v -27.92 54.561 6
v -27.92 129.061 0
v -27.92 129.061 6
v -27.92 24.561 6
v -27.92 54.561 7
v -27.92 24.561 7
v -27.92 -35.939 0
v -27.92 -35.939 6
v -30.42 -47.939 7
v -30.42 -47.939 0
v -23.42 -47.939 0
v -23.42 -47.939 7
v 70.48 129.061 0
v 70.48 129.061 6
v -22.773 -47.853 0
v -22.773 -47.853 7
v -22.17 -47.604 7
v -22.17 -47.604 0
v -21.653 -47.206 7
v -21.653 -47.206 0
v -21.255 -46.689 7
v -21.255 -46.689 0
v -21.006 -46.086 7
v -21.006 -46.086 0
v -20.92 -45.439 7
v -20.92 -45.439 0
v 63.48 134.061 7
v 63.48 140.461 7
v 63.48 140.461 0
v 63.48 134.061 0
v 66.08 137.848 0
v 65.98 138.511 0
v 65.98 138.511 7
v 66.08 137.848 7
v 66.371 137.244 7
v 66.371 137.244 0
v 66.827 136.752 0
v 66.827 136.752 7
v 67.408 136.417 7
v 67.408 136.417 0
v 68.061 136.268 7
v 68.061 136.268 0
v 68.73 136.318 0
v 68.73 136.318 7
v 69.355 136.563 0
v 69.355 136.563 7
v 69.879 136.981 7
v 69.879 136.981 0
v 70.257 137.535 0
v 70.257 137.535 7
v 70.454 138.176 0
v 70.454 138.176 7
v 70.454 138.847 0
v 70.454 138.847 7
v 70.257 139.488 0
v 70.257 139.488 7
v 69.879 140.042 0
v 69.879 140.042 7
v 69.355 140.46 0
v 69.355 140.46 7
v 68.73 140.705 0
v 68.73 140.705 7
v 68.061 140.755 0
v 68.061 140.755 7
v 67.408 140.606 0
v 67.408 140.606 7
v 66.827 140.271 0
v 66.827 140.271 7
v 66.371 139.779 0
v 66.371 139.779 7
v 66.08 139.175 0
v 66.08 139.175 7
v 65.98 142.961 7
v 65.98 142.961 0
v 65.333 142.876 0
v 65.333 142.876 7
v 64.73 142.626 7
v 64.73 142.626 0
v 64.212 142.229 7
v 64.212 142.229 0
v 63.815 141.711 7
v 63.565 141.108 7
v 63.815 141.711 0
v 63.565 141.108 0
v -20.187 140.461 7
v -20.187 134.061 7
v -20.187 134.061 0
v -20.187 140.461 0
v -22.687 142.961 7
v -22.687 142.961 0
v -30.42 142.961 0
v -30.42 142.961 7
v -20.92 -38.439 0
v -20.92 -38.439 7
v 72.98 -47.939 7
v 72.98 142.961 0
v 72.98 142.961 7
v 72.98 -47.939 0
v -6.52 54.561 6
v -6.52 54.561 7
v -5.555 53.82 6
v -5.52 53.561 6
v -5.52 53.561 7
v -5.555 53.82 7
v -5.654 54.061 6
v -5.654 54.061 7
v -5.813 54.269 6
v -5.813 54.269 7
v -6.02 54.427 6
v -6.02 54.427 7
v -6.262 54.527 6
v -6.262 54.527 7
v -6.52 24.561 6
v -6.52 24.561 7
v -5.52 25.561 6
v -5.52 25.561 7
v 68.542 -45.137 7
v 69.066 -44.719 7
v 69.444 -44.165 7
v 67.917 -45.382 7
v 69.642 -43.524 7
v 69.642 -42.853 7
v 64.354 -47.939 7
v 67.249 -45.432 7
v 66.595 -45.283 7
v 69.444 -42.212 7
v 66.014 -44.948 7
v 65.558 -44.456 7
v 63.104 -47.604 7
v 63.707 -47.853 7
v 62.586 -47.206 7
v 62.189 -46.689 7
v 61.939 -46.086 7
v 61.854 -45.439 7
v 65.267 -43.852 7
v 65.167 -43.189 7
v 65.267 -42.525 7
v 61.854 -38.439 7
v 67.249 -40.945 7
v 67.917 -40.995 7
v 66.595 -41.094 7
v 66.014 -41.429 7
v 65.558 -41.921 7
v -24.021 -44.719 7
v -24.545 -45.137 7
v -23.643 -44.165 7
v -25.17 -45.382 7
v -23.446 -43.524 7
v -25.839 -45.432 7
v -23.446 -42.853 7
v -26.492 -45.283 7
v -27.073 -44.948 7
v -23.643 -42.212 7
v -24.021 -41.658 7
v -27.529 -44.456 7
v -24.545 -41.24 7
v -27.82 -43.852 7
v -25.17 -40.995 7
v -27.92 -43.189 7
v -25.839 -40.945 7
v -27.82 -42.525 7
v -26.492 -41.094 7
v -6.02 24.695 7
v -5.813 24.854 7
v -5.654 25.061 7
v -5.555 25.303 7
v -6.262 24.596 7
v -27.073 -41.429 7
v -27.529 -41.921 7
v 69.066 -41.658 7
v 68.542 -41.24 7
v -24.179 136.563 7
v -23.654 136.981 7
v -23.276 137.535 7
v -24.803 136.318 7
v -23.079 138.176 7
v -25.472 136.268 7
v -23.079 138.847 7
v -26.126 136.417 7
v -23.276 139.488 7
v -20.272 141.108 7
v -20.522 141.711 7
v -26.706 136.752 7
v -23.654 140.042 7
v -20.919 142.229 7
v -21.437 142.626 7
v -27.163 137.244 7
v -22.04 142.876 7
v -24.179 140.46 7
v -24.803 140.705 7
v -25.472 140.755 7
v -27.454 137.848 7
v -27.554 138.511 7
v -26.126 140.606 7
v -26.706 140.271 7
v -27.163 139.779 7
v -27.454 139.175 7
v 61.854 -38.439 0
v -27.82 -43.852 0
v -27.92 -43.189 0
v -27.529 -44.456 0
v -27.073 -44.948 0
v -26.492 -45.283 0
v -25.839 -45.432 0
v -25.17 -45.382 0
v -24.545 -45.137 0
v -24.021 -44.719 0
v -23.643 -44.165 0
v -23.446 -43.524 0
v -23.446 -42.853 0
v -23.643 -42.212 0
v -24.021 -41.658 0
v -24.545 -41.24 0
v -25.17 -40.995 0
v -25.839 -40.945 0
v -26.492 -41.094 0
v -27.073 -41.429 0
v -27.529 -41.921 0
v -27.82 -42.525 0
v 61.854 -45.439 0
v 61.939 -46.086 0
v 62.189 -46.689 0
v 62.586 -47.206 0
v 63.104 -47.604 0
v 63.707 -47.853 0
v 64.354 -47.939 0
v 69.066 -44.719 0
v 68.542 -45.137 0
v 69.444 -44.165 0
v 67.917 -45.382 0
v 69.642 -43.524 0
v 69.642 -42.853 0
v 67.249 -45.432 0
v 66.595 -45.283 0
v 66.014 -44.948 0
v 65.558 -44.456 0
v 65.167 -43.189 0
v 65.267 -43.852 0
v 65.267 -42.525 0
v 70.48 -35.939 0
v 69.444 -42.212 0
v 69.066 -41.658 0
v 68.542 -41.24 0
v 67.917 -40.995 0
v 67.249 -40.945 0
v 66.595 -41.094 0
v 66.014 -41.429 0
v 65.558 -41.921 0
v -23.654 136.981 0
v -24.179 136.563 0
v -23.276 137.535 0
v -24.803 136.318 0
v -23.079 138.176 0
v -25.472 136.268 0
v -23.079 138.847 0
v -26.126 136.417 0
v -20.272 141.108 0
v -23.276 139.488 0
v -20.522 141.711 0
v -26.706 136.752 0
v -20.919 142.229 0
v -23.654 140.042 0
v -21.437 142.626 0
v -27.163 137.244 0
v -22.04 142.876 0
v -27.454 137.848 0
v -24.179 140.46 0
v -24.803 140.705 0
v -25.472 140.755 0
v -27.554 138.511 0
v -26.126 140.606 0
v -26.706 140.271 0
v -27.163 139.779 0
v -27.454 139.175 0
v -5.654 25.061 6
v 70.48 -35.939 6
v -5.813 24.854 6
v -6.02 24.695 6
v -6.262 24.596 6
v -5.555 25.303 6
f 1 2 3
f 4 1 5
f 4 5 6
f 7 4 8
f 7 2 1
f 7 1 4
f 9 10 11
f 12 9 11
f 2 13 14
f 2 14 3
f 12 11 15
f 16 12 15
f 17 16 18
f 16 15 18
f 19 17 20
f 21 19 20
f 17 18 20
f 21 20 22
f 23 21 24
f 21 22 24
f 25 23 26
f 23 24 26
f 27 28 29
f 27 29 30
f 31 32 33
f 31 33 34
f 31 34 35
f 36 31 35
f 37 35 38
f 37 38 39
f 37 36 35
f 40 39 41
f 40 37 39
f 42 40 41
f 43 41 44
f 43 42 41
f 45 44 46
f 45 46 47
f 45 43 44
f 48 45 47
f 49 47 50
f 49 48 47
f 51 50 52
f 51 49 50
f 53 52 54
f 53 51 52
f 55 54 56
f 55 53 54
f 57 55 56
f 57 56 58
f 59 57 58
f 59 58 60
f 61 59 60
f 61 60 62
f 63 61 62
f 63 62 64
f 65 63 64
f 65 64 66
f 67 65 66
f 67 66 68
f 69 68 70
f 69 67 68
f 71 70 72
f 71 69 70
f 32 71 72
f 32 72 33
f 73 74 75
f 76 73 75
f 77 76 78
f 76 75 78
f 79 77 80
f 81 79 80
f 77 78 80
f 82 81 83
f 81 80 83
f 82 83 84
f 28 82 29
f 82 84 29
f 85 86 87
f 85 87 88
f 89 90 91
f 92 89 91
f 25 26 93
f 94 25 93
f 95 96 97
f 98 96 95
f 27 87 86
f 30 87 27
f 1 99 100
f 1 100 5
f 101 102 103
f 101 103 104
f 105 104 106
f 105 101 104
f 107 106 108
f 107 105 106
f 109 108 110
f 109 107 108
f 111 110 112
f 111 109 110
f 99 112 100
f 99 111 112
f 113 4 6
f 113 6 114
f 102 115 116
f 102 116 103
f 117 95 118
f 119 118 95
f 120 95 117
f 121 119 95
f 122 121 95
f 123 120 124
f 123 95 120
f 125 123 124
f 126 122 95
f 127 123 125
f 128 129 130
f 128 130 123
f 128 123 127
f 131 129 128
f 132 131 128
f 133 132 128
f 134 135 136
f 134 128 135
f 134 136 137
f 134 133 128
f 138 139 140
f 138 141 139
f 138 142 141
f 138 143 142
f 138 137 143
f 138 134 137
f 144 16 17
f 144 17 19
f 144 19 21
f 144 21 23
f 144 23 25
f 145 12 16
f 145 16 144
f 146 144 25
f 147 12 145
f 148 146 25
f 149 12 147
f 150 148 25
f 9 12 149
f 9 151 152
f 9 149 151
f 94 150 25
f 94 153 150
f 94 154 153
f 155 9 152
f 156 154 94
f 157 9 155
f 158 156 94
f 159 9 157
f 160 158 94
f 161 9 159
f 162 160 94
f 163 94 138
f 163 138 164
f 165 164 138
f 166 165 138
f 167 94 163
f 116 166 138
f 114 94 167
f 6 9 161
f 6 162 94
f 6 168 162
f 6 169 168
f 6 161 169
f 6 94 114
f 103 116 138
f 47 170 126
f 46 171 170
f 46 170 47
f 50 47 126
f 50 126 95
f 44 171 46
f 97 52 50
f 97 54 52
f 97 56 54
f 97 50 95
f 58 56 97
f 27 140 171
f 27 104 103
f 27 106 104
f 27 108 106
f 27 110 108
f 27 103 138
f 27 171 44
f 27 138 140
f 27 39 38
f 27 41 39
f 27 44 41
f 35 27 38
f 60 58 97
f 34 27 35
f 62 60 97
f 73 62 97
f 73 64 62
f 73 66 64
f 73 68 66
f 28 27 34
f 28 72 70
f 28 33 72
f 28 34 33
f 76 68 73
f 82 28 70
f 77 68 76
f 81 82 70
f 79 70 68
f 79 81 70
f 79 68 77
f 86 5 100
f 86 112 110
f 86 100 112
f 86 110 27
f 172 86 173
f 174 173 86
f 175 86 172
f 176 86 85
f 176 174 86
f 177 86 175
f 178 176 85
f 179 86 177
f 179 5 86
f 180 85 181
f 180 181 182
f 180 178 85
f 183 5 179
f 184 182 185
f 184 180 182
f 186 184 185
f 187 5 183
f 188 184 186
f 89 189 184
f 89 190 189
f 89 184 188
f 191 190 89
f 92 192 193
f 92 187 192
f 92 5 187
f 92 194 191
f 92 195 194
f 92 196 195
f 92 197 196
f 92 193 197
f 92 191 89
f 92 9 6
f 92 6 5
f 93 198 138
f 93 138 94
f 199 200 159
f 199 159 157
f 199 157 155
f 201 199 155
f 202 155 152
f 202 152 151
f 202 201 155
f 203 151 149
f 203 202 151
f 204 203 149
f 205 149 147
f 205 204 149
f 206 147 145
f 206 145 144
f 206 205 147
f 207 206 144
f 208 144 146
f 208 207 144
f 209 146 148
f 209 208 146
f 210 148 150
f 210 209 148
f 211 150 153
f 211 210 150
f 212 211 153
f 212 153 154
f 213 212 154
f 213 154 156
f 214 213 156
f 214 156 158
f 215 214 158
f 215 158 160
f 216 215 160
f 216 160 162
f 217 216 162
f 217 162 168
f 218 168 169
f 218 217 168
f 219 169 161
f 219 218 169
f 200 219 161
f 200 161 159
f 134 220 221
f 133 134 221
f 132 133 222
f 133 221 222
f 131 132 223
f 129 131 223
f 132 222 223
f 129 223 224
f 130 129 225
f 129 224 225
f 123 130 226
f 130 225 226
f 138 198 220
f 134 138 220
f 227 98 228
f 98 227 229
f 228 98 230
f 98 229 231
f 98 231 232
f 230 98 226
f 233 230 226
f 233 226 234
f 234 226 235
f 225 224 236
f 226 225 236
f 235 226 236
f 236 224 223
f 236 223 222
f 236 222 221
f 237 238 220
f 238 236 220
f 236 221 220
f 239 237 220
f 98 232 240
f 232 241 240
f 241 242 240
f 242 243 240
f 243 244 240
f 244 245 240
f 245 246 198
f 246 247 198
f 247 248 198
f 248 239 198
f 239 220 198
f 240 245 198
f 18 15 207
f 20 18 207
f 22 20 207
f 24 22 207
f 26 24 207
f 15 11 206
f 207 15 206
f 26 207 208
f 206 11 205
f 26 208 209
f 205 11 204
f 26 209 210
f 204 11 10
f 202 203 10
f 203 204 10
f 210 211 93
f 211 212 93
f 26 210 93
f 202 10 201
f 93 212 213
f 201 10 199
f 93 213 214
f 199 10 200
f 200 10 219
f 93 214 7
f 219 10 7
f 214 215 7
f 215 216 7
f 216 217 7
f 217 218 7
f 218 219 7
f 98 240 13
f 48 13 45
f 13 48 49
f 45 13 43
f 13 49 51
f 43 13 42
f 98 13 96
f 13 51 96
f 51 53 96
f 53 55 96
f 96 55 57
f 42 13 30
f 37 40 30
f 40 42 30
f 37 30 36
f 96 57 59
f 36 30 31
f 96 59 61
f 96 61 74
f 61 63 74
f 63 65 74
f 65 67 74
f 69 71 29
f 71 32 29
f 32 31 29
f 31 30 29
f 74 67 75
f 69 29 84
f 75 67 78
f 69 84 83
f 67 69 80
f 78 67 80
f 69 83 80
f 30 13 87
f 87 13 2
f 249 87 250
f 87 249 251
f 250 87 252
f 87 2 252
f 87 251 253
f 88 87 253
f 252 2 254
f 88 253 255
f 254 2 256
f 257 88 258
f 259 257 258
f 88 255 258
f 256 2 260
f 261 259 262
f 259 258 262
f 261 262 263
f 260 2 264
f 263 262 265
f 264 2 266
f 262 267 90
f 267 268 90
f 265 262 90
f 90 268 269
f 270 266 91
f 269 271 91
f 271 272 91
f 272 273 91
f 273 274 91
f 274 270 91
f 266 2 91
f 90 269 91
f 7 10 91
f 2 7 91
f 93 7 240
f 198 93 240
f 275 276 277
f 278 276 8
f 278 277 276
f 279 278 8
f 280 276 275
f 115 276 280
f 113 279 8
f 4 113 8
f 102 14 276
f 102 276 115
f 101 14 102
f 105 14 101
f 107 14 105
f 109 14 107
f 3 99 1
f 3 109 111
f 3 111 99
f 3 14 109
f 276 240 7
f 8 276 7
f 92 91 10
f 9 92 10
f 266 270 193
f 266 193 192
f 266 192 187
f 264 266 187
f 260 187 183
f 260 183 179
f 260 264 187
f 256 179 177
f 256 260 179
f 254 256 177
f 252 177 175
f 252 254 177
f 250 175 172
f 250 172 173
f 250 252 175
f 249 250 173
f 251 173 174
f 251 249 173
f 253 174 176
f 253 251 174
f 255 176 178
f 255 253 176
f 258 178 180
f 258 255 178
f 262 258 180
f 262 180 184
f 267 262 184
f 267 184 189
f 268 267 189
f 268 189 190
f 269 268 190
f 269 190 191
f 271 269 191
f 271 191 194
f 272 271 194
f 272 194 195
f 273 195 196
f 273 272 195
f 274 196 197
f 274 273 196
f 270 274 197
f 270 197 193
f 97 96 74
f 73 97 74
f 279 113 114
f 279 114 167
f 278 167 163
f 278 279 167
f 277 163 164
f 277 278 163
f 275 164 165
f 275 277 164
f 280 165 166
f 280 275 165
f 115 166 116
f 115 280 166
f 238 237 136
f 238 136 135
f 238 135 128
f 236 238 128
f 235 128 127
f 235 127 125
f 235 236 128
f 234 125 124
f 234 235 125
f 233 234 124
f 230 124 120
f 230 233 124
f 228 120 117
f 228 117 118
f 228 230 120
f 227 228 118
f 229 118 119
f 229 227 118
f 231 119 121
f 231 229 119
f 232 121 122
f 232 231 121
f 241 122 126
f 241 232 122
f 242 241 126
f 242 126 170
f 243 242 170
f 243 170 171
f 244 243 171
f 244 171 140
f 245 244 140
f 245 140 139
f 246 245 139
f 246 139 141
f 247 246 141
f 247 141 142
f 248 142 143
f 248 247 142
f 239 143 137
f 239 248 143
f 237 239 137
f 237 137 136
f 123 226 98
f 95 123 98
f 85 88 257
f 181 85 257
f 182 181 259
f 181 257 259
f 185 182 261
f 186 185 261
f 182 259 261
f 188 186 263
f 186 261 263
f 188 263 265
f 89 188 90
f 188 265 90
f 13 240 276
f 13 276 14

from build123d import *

# Parameters (mm, degrees)
IZIM1_W                     = 172.5
IZIM1_H                     = 103.4
IZIM1_W_2                   = 165
IZIM1_H_2                   = 98.4
Y_KSEKLIK_EKSTR_ZYON1_DEPTH = 6
Y_KSEKLIK_EKSTR_ZYON2_DEPTH = 1
IZIM3_R                     = 2.25
Y_KSEKLIK_EKSTR_ZYON3_DEPTH = 7


with BuildPart() as part:
    # Çizim1 → Yükseklik-Ekstrüzyon1 (new body)
    with BuildSketch(Plane(origin=(0, 0, 0), x_dir=(0, 1, 0), z_dir=(0, 0, 1))):
        with Locations((47.811428221, -21.27957211)):
            Rectangle(IZIM1_W, IZIM1_H)
        with Locations((46.561428221, -21.27957211)):
            Rectangle(IZIM1_W_2, IZIM1_H_2, mode=Mode.SUBTRACT)
    extrude(amount=Y_KSEKLIK_EKSTR_ZYON1_DEPTH)

    # Çizim2 → Yükseklik-Ekstrüzyon2 (add)
    with BuildSketch(Plane.XY.offset(6)):
        Polygon((-30.42042789, 54.561428221), (-30.42042789, 134.061428221), (72.97957211, 134.061428221), (72.97957211, -38.438571779), (-30.42042789, -38.438571779), (-30.42042789, 24.561428221), align=None)
        with BuildLine():
            Line((-27.92042789, 24.561428221), (-6.52042789, 24.561428221))
            ThreePointArc((-6.52042789, 24.561428221), (-5.813321109, 24.85432144), (-5.52042789, 25.561428221))
            Line((-5.52042789, 25.561428221), (-5.52042789, 53.561428221))
            ThreePointArc((-5.52042789, 53.561428221), (-5.813321109, 54.268535002), (-6.52042789, 54.561428221))
            Line((-6.52042789, 54.561428221), (-27.92042789, 54.561428221))
            Line((-27.92042789, 54.561428221), (-27.92042789, 24.561428221))
        make_face(mode=Mode.SUBTRACT)
    extrude(amount=Y_KSEKLIK_EKSTR_ZYON2_DEPTH)

    # Çizim3 → Yükseklik-Ekstrüzyon3 (add)
    # profile 1 of 4: a face of its own
    with BuildSketch(Plane(origin=(0, 0, 0), x_dir=(0, 1, 0), z_dir=(0, 0, 1))):
        with BuildLine():
            Line((-38.438571779, 30.42042789), (-47.938571779, 30.42042789))
            Line((-47.938571779, 30.42042789), (-47.938571779, 23.42042789))
            ThreePointArc((-47.938571779, 23.42042789), (-47.206338732, 21.652660937), (-45.438571779, 20.92042789))
            Line((-45.438571779, 20.92042789), (-38.438571779, 20.92042789))
            Line((-38.438571779, 20.92042789), (-38.438571779, 30.42042789))
        make_face()
        with Locations(Location((-43.188571779, 25.67042789, 0), (0, 0, 90))):
            Circle(IZIM3_R, mode=Mode.SUBTRACT)
    # profile 2 of 4: a face of its own
    with BuildSketch(Plane(origin=(0, 0, 0), x_dir=(0, 1, 0), z_dir=(0, 0, 1))):
        with BuildLine():
            Line((-38.438571779, -61.85378906), (-45.438571779, -61.85378906))
            ThreePointArc((-45.438571779, -61.85378906), (-47.206338732, -62.586022107), (-47.938571779, -64.35378906))
            Line((-47.938571779, -64.35378906), (-47.938571779, -72.97957211))
            Line((-47.938571779, -72.97957211), (-38.438571779, -72.97957211))
            Line((-38.438571779, -72.97957211), (-38.438571779, -61.85378906))
        make_face()
        with Locations(Location((-43.188571779, -67.416680585, 0), (0, 0, 90))):
            Circle(IZIM3_R, mode=Mode.SUBTRACT)
    # profile 3 of 4: a face of its own
    with BuildSketch(Plane(origin=(0, 0, 0), x_dir=(0, 1, 0), z_dir=(0, 0, 1))):
        with BuildLine():
            Line((142.961428221, 30.42042789), (134.061428221, 30.42042789))
            Line((134.061428221, 30.42042789), (134.061428221, 20.186573321))
            Line((134.061428221, 20.186573321), (140.461428221, 20.186573321))
            ThreePointArc((140.461428221, 20.186573321), (142.229195174, 20.918806368), (142.961428221, 22.686573321))
            Line((142.961428221, 22.686573321), (142.961428221, 30.42042789))
        make_face()
        with Locations(Location((138.511428221, 25.303500605, 0), (0, 0, 90))):
            Circle(IZIM3_R, mode=Mode.SUBTRACT)
    # profile 4 of 4: a face of its own
    with BuildSketch(Plane(origin=(0, 0, 0), x_dir=(0, 1, 0), z_dir=(0, 0, 1))):
        with BuildLine():
            Line((140.461428221, -63.47957211), (134.061428221, -63.47957211))
            Line((134.061428221, -63.47957211), (134.061428221, -72.97957211))
            Line((134.061428221, -72.97957211), (142.961428221, -72.97957211))
            Line((142.961428221, -72.97957211), (142.961428221, -65.97957211))
            ThreePointArc((142.961428221, -65.97957211), (142.229195174, -64.211805157), (140.461428221, -63.47957211))
        make_face()
        with Locations(Location((138.511428221, -68.22957211, 0), (0, 0, 90))):
            Circle(IZIM3_R, mode=Mode.SUBTRACT)
    extrude(amount=Y_KSEKLIK_EKSTR_ZYON3_DEPTH)


solid = part.part
